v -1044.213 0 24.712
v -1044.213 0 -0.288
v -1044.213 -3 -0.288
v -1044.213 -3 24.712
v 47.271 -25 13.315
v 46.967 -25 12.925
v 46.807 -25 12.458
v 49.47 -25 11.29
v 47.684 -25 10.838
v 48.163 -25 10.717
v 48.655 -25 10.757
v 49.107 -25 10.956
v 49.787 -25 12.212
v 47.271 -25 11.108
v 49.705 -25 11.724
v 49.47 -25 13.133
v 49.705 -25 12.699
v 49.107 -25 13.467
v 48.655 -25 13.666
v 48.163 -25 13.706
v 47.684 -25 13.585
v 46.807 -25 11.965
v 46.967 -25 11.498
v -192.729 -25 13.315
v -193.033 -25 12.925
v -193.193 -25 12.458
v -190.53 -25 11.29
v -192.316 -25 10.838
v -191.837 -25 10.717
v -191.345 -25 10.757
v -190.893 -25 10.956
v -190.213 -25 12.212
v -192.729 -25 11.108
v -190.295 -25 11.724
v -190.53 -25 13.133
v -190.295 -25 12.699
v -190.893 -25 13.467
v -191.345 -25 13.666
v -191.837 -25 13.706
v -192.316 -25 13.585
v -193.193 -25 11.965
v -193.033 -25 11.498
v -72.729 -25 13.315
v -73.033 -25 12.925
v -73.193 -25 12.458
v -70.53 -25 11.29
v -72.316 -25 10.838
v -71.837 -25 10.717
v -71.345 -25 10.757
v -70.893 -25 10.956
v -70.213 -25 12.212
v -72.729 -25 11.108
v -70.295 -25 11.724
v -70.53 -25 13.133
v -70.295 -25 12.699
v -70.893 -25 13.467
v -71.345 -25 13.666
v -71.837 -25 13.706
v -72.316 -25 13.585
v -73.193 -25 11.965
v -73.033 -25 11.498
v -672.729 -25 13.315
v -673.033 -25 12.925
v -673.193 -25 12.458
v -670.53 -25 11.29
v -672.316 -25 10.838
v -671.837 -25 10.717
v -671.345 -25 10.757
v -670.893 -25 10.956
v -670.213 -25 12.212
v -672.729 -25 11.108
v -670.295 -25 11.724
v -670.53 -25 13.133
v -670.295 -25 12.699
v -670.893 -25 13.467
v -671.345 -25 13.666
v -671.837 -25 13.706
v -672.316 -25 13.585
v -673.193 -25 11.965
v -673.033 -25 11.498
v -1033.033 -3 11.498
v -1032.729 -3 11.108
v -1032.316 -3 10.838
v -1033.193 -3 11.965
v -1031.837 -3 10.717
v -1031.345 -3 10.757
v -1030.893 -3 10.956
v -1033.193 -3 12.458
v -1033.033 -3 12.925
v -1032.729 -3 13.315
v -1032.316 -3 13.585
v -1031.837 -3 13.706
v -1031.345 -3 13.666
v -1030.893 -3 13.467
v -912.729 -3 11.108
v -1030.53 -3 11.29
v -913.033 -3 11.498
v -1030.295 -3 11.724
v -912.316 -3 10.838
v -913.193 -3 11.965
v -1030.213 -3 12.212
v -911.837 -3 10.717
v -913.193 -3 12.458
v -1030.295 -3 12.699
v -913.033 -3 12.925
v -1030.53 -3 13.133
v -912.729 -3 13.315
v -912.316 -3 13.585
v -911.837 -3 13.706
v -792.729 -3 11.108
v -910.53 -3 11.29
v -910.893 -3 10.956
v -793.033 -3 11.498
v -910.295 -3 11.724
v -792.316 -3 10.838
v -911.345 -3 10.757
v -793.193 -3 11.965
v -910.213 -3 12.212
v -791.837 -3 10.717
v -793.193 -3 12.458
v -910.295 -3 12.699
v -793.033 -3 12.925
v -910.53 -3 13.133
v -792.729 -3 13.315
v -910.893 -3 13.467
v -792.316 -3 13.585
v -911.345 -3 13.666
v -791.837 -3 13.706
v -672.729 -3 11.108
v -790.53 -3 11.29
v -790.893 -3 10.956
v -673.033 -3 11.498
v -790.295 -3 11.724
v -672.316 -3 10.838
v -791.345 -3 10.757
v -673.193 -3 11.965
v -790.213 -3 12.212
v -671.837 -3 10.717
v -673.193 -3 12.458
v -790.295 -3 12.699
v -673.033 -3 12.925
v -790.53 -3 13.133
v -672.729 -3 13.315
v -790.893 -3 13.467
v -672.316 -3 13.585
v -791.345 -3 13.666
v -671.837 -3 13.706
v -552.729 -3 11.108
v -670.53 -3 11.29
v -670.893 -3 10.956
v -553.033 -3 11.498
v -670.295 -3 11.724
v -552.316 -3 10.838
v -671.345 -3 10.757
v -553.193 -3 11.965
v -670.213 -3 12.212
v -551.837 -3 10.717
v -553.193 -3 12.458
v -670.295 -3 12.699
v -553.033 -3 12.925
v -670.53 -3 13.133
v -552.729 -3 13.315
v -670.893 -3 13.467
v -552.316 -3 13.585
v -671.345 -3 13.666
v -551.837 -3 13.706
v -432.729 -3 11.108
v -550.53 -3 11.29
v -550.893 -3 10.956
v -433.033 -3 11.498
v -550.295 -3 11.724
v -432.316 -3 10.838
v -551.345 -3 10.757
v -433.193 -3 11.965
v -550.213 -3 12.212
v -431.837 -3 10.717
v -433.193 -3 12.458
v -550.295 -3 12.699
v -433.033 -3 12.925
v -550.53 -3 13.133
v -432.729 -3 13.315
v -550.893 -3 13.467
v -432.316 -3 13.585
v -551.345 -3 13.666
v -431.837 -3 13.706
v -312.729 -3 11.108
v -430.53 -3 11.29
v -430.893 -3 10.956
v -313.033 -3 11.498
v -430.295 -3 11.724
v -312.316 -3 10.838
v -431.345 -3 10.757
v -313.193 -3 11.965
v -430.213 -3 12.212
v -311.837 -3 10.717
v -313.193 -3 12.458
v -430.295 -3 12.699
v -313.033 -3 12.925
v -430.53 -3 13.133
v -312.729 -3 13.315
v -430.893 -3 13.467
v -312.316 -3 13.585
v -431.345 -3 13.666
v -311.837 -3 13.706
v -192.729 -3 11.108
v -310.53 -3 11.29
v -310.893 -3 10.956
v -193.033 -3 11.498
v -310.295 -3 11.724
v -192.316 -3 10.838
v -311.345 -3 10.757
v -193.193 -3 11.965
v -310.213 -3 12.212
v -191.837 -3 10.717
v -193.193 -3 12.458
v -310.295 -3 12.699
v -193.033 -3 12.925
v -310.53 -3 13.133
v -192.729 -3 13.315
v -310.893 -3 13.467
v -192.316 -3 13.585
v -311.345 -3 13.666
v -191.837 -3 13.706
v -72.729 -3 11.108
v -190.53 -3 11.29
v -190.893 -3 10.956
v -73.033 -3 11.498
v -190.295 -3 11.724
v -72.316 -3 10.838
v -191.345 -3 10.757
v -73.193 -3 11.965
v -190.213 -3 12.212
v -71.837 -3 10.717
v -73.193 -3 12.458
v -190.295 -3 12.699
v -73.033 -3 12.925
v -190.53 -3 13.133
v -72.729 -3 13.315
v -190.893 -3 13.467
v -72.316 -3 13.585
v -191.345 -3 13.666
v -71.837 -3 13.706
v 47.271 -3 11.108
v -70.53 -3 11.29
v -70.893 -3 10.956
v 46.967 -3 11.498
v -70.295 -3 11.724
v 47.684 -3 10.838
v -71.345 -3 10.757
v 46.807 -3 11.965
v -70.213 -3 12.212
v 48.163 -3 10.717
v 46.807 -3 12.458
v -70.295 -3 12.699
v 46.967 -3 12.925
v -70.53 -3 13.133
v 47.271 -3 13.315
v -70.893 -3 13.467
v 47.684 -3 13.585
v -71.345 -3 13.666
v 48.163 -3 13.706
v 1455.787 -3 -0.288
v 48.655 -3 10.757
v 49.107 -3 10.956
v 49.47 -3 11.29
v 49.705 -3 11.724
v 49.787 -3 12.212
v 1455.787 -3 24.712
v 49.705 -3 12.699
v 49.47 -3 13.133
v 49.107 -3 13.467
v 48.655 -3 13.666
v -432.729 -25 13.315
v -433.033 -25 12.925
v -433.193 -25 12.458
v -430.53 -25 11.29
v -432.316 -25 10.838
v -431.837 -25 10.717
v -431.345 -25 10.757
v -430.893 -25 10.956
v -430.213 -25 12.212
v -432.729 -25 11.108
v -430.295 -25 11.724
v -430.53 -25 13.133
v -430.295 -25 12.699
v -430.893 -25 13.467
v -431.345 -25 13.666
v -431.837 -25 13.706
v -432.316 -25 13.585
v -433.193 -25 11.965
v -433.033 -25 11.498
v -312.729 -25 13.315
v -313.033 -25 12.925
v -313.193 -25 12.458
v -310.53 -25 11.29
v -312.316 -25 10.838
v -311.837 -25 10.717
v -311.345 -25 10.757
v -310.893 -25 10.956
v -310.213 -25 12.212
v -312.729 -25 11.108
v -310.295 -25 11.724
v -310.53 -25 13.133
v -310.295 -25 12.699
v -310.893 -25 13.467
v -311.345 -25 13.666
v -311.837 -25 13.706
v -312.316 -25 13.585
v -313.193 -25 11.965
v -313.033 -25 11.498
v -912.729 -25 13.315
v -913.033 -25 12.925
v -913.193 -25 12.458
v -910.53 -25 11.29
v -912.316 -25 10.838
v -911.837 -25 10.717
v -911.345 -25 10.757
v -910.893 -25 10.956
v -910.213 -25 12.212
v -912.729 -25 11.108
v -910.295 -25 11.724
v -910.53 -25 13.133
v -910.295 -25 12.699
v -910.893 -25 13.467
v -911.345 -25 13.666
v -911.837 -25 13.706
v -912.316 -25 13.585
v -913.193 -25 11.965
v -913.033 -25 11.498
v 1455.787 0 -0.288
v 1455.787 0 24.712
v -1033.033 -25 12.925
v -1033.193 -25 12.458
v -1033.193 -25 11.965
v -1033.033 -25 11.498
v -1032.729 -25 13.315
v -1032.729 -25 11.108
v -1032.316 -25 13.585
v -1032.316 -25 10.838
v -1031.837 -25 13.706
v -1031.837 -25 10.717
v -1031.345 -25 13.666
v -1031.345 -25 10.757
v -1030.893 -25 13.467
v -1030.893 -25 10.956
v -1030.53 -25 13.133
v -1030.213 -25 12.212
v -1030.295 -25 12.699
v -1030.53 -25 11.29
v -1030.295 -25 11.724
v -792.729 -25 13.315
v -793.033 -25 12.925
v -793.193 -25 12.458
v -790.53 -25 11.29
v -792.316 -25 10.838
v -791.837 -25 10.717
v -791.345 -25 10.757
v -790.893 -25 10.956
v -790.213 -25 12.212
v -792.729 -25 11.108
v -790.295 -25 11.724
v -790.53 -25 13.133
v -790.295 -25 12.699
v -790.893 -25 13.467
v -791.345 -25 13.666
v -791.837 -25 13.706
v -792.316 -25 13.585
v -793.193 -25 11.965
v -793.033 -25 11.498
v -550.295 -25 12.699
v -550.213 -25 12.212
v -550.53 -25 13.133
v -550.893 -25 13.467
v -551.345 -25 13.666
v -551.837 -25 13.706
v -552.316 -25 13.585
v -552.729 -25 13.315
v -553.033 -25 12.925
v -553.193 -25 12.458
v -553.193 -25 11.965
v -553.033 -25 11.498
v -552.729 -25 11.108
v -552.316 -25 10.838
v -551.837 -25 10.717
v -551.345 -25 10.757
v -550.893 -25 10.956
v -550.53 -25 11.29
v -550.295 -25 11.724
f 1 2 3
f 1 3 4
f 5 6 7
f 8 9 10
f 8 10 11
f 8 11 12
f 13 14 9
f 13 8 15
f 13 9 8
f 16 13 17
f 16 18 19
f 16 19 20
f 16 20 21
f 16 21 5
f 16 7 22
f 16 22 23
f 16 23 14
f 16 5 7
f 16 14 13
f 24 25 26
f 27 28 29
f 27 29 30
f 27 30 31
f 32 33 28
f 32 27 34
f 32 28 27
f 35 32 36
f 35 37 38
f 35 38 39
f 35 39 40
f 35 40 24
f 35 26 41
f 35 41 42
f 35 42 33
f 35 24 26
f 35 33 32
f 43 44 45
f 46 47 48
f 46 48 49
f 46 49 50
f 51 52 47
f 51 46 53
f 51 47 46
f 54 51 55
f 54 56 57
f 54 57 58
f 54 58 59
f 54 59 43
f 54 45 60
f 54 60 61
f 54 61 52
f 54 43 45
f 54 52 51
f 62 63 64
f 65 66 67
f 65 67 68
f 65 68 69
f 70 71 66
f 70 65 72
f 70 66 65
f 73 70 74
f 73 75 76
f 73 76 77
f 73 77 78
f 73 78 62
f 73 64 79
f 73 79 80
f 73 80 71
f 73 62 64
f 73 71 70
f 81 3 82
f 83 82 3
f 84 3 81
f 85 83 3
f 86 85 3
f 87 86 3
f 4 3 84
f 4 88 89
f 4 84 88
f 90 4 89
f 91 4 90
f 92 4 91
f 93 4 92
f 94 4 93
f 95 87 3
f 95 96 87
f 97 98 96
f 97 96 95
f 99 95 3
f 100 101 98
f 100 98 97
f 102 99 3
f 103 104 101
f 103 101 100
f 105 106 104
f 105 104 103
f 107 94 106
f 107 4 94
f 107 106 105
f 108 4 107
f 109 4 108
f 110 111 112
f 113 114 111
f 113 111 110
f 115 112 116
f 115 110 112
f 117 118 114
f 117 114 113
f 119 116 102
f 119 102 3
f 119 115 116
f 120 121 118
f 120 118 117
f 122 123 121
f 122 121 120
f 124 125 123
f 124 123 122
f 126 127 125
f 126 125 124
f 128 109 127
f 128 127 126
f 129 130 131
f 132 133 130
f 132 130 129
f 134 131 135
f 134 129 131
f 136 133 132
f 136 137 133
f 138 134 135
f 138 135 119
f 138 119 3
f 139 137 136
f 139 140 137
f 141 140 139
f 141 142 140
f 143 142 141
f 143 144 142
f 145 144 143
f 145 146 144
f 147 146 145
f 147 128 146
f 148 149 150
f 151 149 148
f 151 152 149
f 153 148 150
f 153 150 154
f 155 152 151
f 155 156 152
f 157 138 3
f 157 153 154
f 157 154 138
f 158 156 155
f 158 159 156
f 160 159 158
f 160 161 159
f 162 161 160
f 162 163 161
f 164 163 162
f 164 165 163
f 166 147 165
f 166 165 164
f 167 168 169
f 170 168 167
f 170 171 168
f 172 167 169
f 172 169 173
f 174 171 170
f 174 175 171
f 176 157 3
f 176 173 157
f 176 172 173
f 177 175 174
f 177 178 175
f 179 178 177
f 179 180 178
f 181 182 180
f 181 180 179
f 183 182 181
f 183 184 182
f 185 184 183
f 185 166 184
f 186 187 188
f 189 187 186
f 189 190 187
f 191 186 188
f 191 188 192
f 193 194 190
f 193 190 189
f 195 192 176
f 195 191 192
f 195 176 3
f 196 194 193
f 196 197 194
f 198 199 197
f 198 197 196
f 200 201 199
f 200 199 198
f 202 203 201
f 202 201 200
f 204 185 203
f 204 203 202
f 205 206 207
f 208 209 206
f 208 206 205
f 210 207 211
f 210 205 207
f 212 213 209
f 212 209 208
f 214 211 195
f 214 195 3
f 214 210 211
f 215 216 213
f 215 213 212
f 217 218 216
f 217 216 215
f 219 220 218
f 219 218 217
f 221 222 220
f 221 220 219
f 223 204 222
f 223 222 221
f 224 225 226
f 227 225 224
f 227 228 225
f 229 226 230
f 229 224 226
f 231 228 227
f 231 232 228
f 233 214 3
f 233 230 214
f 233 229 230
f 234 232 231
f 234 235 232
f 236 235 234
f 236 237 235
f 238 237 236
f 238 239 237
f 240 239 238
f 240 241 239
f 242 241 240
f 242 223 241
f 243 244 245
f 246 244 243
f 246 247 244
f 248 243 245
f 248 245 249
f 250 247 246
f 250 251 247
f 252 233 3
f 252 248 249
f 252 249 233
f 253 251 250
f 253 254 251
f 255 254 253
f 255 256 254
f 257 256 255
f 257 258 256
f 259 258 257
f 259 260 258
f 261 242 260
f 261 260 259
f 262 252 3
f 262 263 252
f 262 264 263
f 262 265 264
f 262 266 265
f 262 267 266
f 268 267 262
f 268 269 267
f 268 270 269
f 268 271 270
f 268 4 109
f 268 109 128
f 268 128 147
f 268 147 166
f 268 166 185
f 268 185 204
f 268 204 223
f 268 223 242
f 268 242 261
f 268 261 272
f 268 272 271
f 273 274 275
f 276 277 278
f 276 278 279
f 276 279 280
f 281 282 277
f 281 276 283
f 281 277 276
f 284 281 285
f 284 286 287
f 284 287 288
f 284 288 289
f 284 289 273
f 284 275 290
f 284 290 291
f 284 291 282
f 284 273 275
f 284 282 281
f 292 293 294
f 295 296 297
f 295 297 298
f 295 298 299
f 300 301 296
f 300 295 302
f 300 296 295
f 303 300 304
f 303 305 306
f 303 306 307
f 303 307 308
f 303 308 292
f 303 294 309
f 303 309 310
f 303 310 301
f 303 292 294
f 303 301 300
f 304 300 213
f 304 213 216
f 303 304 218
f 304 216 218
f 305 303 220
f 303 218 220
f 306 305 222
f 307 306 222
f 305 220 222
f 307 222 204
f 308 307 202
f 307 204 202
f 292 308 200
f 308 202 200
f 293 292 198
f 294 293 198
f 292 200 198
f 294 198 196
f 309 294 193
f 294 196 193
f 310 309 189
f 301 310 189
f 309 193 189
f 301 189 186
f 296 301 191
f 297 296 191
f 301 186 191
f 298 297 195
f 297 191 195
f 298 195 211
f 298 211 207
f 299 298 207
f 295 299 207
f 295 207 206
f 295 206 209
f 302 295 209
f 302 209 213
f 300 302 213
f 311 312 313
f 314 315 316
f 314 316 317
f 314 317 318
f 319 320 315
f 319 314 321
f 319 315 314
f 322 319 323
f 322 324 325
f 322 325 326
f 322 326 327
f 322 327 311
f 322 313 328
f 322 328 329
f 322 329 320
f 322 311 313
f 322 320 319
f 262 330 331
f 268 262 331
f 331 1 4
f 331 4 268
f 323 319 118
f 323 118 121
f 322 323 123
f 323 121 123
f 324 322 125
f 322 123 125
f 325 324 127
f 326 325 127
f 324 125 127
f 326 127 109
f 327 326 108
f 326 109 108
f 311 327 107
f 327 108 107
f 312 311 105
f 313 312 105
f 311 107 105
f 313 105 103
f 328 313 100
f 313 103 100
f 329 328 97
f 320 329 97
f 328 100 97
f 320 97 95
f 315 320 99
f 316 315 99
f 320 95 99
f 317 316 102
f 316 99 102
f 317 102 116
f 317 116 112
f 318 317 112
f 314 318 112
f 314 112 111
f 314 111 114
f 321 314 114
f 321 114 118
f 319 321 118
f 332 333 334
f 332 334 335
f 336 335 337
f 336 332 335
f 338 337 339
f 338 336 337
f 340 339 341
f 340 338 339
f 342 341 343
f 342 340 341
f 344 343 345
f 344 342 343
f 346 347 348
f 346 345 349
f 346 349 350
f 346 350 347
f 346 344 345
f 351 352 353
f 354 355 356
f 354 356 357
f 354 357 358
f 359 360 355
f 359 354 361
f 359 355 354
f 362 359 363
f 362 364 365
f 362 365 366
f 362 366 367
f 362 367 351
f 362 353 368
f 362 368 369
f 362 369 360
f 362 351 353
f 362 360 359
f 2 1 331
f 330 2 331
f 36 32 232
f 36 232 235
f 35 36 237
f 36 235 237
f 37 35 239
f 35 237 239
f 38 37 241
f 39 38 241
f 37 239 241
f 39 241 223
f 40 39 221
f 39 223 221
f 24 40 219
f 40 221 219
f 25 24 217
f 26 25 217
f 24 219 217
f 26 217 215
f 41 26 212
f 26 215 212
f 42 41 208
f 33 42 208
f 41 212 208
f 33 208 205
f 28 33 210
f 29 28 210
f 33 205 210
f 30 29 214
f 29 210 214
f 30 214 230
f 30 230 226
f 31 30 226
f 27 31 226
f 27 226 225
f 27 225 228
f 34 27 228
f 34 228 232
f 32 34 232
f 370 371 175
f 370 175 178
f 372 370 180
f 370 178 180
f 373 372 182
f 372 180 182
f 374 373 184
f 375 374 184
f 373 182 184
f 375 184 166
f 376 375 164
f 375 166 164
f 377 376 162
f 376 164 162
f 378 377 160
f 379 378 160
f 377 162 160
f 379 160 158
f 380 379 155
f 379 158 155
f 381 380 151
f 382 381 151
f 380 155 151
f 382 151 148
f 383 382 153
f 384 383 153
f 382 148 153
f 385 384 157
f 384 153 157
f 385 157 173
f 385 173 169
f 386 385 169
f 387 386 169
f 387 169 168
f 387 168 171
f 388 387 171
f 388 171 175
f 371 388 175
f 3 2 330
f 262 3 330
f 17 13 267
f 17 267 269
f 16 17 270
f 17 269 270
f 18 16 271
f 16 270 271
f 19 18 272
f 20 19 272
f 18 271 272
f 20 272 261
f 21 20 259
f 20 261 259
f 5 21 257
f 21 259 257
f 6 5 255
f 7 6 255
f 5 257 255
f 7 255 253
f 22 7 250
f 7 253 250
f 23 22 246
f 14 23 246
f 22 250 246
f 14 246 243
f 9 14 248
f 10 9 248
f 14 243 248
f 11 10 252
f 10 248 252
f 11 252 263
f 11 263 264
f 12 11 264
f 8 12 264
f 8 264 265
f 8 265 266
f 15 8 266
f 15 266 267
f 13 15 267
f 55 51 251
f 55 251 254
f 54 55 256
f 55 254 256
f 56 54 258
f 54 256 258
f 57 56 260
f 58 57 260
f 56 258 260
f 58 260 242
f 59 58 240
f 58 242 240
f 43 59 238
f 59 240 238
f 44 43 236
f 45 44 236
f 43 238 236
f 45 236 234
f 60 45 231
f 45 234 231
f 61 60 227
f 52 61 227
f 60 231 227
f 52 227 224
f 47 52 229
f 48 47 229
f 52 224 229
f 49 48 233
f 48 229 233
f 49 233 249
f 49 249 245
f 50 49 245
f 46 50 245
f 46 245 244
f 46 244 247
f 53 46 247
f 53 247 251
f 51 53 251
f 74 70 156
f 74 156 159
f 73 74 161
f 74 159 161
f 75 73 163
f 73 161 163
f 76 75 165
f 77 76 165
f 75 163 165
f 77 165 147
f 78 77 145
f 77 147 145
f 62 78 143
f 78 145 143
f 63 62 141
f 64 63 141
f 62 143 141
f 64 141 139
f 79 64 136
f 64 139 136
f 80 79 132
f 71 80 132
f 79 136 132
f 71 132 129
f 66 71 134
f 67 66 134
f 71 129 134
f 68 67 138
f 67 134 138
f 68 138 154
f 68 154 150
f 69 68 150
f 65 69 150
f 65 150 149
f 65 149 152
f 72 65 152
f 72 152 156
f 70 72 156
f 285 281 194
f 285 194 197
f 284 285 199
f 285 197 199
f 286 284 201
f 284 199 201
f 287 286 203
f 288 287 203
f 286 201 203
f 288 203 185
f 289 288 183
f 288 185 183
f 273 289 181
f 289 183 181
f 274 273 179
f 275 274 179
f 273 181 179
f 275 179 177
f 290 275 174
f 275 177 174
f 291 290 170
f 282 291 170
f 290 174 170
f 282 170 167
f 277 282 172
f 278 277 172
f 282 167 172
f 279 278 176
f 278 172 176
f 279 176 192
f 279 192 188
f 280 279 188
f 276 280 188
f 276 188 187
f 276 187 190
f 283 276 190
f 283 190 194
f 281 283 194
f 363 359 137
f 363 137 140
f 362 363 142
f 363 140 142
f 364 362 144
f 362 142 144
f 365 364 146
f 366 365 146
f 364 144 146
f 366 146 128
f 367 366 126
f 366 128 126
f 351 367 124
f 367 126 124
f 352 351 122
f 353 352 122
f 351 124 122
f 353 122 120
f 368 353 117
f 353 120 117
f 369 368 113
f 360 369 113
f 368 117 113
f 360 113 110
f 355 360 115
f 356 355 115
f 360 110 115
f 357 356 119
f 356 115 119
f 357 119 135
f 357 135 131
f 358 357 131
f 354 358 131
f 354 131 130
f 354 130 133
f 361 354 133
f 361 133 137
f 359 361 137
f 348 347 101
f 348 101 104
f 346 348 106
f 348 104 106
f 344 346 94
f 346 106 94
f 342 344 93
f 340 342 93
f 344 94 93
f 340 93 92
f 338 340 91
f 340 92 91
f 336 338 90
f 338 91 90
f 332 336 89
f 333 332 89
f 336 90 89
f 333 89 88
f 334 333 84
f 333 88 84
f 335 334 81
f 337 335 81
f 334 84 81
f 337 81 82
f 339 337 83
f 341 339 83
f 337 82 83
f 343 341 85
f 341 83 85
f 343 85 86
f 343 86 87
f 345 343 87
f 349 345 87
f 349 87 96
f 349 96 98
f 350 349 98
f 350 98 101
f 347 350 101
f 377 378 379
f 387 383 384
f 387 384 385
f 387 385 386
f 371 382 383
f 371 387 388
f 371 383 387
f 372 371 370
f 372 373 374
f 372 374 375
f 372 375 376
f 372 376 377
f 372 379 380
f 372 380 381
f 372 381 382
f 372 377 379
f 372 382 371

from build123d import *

# Parameters (mm, degrees)
F0_W     = 2500
F0_H     = 25
F0_R     = 1.5
F1_DEPTH = 3
F2_DEPTH = 25


with BuildPart() as f1:
    # F0 (on Front) → F1 (new body)
    with BuildSketch(Plane.XZ):
        with Locations((205.786598, 12.211518)):
            Rectangle(F0_W, F0_H)
        with Locations((-1031.713402, 12.211518)):
            Circle(F0_R, mode=Mode.SUBTRACT)
        with Locations((-911.713402, 12.211518)):
            Circle(F0_R, mode=Mode.SUBTRACT)
        with Locations((-791.713402, 12.211518)):
            Circle(F0_R, mode=Mode.SUBTRACT)
        with Locations((-671.713402, 12.211518)):
            Circle(F0_R, mode=Mode.SUBTRACT)
        with Locations((-551.713402, 12.211518)):
            Circle(F0_R, mode=Mode.SUBTRACT)
        with Locations((-431.713402, 12.211518)):
            Circle(F0_R, mode=Mode.SUBTRACT)
        with Locations((-311.713402, 12.211518)):
            Circle(F0_R, mode=Mode.SUBTRACT)
        with Locations((-191.713402, 12.211518)):
            Circle(F0_R, mode=Mode.SUBTRACT)
        with Locations((-71.713402, 12.211518)):
            Circle(F0_R, mode=Mode.SUBTRACT)
        with Locations((48.286598, 12.211518)):
            Circle(F0_R, mode=Mode.SUBTRACT)
    extrude(amount=F1_DEPTH)

    # F0 (on Front) → F2 (join)
    with BuildSketch(Plane.XZ):
        with Locations((-1031.713402, 12.211518)):
            Circle(F0_R)
        with Locations((-911.713402, 12.211518)):
            Circle(F0_R)
        with Locations((-791.713402, 12.211518)):
            Circle(F0_R)
        with Locations((-671.713402, 12.211518)):
            Circle(F0_R)
        with Locations((-551.713402, 12.211518)):
            Circle(F0_R)
        with Locations((-431.713402, 12.211518)):
            Circle(F0_R)
        with Locations((-311.713402, 12.211518)):
            Circle(F0_R)
        with Locations((-191.713402, 12.211518)):
            Circle(F0_R)
        with Locations((-71.713402, 12.211518)):
            Circle(F0_R)
        with Locations((48.286598, 12.211518)):
            Circle(F0_R)
    extrude(amount=F2_DEPTH)


solid = f1.part
